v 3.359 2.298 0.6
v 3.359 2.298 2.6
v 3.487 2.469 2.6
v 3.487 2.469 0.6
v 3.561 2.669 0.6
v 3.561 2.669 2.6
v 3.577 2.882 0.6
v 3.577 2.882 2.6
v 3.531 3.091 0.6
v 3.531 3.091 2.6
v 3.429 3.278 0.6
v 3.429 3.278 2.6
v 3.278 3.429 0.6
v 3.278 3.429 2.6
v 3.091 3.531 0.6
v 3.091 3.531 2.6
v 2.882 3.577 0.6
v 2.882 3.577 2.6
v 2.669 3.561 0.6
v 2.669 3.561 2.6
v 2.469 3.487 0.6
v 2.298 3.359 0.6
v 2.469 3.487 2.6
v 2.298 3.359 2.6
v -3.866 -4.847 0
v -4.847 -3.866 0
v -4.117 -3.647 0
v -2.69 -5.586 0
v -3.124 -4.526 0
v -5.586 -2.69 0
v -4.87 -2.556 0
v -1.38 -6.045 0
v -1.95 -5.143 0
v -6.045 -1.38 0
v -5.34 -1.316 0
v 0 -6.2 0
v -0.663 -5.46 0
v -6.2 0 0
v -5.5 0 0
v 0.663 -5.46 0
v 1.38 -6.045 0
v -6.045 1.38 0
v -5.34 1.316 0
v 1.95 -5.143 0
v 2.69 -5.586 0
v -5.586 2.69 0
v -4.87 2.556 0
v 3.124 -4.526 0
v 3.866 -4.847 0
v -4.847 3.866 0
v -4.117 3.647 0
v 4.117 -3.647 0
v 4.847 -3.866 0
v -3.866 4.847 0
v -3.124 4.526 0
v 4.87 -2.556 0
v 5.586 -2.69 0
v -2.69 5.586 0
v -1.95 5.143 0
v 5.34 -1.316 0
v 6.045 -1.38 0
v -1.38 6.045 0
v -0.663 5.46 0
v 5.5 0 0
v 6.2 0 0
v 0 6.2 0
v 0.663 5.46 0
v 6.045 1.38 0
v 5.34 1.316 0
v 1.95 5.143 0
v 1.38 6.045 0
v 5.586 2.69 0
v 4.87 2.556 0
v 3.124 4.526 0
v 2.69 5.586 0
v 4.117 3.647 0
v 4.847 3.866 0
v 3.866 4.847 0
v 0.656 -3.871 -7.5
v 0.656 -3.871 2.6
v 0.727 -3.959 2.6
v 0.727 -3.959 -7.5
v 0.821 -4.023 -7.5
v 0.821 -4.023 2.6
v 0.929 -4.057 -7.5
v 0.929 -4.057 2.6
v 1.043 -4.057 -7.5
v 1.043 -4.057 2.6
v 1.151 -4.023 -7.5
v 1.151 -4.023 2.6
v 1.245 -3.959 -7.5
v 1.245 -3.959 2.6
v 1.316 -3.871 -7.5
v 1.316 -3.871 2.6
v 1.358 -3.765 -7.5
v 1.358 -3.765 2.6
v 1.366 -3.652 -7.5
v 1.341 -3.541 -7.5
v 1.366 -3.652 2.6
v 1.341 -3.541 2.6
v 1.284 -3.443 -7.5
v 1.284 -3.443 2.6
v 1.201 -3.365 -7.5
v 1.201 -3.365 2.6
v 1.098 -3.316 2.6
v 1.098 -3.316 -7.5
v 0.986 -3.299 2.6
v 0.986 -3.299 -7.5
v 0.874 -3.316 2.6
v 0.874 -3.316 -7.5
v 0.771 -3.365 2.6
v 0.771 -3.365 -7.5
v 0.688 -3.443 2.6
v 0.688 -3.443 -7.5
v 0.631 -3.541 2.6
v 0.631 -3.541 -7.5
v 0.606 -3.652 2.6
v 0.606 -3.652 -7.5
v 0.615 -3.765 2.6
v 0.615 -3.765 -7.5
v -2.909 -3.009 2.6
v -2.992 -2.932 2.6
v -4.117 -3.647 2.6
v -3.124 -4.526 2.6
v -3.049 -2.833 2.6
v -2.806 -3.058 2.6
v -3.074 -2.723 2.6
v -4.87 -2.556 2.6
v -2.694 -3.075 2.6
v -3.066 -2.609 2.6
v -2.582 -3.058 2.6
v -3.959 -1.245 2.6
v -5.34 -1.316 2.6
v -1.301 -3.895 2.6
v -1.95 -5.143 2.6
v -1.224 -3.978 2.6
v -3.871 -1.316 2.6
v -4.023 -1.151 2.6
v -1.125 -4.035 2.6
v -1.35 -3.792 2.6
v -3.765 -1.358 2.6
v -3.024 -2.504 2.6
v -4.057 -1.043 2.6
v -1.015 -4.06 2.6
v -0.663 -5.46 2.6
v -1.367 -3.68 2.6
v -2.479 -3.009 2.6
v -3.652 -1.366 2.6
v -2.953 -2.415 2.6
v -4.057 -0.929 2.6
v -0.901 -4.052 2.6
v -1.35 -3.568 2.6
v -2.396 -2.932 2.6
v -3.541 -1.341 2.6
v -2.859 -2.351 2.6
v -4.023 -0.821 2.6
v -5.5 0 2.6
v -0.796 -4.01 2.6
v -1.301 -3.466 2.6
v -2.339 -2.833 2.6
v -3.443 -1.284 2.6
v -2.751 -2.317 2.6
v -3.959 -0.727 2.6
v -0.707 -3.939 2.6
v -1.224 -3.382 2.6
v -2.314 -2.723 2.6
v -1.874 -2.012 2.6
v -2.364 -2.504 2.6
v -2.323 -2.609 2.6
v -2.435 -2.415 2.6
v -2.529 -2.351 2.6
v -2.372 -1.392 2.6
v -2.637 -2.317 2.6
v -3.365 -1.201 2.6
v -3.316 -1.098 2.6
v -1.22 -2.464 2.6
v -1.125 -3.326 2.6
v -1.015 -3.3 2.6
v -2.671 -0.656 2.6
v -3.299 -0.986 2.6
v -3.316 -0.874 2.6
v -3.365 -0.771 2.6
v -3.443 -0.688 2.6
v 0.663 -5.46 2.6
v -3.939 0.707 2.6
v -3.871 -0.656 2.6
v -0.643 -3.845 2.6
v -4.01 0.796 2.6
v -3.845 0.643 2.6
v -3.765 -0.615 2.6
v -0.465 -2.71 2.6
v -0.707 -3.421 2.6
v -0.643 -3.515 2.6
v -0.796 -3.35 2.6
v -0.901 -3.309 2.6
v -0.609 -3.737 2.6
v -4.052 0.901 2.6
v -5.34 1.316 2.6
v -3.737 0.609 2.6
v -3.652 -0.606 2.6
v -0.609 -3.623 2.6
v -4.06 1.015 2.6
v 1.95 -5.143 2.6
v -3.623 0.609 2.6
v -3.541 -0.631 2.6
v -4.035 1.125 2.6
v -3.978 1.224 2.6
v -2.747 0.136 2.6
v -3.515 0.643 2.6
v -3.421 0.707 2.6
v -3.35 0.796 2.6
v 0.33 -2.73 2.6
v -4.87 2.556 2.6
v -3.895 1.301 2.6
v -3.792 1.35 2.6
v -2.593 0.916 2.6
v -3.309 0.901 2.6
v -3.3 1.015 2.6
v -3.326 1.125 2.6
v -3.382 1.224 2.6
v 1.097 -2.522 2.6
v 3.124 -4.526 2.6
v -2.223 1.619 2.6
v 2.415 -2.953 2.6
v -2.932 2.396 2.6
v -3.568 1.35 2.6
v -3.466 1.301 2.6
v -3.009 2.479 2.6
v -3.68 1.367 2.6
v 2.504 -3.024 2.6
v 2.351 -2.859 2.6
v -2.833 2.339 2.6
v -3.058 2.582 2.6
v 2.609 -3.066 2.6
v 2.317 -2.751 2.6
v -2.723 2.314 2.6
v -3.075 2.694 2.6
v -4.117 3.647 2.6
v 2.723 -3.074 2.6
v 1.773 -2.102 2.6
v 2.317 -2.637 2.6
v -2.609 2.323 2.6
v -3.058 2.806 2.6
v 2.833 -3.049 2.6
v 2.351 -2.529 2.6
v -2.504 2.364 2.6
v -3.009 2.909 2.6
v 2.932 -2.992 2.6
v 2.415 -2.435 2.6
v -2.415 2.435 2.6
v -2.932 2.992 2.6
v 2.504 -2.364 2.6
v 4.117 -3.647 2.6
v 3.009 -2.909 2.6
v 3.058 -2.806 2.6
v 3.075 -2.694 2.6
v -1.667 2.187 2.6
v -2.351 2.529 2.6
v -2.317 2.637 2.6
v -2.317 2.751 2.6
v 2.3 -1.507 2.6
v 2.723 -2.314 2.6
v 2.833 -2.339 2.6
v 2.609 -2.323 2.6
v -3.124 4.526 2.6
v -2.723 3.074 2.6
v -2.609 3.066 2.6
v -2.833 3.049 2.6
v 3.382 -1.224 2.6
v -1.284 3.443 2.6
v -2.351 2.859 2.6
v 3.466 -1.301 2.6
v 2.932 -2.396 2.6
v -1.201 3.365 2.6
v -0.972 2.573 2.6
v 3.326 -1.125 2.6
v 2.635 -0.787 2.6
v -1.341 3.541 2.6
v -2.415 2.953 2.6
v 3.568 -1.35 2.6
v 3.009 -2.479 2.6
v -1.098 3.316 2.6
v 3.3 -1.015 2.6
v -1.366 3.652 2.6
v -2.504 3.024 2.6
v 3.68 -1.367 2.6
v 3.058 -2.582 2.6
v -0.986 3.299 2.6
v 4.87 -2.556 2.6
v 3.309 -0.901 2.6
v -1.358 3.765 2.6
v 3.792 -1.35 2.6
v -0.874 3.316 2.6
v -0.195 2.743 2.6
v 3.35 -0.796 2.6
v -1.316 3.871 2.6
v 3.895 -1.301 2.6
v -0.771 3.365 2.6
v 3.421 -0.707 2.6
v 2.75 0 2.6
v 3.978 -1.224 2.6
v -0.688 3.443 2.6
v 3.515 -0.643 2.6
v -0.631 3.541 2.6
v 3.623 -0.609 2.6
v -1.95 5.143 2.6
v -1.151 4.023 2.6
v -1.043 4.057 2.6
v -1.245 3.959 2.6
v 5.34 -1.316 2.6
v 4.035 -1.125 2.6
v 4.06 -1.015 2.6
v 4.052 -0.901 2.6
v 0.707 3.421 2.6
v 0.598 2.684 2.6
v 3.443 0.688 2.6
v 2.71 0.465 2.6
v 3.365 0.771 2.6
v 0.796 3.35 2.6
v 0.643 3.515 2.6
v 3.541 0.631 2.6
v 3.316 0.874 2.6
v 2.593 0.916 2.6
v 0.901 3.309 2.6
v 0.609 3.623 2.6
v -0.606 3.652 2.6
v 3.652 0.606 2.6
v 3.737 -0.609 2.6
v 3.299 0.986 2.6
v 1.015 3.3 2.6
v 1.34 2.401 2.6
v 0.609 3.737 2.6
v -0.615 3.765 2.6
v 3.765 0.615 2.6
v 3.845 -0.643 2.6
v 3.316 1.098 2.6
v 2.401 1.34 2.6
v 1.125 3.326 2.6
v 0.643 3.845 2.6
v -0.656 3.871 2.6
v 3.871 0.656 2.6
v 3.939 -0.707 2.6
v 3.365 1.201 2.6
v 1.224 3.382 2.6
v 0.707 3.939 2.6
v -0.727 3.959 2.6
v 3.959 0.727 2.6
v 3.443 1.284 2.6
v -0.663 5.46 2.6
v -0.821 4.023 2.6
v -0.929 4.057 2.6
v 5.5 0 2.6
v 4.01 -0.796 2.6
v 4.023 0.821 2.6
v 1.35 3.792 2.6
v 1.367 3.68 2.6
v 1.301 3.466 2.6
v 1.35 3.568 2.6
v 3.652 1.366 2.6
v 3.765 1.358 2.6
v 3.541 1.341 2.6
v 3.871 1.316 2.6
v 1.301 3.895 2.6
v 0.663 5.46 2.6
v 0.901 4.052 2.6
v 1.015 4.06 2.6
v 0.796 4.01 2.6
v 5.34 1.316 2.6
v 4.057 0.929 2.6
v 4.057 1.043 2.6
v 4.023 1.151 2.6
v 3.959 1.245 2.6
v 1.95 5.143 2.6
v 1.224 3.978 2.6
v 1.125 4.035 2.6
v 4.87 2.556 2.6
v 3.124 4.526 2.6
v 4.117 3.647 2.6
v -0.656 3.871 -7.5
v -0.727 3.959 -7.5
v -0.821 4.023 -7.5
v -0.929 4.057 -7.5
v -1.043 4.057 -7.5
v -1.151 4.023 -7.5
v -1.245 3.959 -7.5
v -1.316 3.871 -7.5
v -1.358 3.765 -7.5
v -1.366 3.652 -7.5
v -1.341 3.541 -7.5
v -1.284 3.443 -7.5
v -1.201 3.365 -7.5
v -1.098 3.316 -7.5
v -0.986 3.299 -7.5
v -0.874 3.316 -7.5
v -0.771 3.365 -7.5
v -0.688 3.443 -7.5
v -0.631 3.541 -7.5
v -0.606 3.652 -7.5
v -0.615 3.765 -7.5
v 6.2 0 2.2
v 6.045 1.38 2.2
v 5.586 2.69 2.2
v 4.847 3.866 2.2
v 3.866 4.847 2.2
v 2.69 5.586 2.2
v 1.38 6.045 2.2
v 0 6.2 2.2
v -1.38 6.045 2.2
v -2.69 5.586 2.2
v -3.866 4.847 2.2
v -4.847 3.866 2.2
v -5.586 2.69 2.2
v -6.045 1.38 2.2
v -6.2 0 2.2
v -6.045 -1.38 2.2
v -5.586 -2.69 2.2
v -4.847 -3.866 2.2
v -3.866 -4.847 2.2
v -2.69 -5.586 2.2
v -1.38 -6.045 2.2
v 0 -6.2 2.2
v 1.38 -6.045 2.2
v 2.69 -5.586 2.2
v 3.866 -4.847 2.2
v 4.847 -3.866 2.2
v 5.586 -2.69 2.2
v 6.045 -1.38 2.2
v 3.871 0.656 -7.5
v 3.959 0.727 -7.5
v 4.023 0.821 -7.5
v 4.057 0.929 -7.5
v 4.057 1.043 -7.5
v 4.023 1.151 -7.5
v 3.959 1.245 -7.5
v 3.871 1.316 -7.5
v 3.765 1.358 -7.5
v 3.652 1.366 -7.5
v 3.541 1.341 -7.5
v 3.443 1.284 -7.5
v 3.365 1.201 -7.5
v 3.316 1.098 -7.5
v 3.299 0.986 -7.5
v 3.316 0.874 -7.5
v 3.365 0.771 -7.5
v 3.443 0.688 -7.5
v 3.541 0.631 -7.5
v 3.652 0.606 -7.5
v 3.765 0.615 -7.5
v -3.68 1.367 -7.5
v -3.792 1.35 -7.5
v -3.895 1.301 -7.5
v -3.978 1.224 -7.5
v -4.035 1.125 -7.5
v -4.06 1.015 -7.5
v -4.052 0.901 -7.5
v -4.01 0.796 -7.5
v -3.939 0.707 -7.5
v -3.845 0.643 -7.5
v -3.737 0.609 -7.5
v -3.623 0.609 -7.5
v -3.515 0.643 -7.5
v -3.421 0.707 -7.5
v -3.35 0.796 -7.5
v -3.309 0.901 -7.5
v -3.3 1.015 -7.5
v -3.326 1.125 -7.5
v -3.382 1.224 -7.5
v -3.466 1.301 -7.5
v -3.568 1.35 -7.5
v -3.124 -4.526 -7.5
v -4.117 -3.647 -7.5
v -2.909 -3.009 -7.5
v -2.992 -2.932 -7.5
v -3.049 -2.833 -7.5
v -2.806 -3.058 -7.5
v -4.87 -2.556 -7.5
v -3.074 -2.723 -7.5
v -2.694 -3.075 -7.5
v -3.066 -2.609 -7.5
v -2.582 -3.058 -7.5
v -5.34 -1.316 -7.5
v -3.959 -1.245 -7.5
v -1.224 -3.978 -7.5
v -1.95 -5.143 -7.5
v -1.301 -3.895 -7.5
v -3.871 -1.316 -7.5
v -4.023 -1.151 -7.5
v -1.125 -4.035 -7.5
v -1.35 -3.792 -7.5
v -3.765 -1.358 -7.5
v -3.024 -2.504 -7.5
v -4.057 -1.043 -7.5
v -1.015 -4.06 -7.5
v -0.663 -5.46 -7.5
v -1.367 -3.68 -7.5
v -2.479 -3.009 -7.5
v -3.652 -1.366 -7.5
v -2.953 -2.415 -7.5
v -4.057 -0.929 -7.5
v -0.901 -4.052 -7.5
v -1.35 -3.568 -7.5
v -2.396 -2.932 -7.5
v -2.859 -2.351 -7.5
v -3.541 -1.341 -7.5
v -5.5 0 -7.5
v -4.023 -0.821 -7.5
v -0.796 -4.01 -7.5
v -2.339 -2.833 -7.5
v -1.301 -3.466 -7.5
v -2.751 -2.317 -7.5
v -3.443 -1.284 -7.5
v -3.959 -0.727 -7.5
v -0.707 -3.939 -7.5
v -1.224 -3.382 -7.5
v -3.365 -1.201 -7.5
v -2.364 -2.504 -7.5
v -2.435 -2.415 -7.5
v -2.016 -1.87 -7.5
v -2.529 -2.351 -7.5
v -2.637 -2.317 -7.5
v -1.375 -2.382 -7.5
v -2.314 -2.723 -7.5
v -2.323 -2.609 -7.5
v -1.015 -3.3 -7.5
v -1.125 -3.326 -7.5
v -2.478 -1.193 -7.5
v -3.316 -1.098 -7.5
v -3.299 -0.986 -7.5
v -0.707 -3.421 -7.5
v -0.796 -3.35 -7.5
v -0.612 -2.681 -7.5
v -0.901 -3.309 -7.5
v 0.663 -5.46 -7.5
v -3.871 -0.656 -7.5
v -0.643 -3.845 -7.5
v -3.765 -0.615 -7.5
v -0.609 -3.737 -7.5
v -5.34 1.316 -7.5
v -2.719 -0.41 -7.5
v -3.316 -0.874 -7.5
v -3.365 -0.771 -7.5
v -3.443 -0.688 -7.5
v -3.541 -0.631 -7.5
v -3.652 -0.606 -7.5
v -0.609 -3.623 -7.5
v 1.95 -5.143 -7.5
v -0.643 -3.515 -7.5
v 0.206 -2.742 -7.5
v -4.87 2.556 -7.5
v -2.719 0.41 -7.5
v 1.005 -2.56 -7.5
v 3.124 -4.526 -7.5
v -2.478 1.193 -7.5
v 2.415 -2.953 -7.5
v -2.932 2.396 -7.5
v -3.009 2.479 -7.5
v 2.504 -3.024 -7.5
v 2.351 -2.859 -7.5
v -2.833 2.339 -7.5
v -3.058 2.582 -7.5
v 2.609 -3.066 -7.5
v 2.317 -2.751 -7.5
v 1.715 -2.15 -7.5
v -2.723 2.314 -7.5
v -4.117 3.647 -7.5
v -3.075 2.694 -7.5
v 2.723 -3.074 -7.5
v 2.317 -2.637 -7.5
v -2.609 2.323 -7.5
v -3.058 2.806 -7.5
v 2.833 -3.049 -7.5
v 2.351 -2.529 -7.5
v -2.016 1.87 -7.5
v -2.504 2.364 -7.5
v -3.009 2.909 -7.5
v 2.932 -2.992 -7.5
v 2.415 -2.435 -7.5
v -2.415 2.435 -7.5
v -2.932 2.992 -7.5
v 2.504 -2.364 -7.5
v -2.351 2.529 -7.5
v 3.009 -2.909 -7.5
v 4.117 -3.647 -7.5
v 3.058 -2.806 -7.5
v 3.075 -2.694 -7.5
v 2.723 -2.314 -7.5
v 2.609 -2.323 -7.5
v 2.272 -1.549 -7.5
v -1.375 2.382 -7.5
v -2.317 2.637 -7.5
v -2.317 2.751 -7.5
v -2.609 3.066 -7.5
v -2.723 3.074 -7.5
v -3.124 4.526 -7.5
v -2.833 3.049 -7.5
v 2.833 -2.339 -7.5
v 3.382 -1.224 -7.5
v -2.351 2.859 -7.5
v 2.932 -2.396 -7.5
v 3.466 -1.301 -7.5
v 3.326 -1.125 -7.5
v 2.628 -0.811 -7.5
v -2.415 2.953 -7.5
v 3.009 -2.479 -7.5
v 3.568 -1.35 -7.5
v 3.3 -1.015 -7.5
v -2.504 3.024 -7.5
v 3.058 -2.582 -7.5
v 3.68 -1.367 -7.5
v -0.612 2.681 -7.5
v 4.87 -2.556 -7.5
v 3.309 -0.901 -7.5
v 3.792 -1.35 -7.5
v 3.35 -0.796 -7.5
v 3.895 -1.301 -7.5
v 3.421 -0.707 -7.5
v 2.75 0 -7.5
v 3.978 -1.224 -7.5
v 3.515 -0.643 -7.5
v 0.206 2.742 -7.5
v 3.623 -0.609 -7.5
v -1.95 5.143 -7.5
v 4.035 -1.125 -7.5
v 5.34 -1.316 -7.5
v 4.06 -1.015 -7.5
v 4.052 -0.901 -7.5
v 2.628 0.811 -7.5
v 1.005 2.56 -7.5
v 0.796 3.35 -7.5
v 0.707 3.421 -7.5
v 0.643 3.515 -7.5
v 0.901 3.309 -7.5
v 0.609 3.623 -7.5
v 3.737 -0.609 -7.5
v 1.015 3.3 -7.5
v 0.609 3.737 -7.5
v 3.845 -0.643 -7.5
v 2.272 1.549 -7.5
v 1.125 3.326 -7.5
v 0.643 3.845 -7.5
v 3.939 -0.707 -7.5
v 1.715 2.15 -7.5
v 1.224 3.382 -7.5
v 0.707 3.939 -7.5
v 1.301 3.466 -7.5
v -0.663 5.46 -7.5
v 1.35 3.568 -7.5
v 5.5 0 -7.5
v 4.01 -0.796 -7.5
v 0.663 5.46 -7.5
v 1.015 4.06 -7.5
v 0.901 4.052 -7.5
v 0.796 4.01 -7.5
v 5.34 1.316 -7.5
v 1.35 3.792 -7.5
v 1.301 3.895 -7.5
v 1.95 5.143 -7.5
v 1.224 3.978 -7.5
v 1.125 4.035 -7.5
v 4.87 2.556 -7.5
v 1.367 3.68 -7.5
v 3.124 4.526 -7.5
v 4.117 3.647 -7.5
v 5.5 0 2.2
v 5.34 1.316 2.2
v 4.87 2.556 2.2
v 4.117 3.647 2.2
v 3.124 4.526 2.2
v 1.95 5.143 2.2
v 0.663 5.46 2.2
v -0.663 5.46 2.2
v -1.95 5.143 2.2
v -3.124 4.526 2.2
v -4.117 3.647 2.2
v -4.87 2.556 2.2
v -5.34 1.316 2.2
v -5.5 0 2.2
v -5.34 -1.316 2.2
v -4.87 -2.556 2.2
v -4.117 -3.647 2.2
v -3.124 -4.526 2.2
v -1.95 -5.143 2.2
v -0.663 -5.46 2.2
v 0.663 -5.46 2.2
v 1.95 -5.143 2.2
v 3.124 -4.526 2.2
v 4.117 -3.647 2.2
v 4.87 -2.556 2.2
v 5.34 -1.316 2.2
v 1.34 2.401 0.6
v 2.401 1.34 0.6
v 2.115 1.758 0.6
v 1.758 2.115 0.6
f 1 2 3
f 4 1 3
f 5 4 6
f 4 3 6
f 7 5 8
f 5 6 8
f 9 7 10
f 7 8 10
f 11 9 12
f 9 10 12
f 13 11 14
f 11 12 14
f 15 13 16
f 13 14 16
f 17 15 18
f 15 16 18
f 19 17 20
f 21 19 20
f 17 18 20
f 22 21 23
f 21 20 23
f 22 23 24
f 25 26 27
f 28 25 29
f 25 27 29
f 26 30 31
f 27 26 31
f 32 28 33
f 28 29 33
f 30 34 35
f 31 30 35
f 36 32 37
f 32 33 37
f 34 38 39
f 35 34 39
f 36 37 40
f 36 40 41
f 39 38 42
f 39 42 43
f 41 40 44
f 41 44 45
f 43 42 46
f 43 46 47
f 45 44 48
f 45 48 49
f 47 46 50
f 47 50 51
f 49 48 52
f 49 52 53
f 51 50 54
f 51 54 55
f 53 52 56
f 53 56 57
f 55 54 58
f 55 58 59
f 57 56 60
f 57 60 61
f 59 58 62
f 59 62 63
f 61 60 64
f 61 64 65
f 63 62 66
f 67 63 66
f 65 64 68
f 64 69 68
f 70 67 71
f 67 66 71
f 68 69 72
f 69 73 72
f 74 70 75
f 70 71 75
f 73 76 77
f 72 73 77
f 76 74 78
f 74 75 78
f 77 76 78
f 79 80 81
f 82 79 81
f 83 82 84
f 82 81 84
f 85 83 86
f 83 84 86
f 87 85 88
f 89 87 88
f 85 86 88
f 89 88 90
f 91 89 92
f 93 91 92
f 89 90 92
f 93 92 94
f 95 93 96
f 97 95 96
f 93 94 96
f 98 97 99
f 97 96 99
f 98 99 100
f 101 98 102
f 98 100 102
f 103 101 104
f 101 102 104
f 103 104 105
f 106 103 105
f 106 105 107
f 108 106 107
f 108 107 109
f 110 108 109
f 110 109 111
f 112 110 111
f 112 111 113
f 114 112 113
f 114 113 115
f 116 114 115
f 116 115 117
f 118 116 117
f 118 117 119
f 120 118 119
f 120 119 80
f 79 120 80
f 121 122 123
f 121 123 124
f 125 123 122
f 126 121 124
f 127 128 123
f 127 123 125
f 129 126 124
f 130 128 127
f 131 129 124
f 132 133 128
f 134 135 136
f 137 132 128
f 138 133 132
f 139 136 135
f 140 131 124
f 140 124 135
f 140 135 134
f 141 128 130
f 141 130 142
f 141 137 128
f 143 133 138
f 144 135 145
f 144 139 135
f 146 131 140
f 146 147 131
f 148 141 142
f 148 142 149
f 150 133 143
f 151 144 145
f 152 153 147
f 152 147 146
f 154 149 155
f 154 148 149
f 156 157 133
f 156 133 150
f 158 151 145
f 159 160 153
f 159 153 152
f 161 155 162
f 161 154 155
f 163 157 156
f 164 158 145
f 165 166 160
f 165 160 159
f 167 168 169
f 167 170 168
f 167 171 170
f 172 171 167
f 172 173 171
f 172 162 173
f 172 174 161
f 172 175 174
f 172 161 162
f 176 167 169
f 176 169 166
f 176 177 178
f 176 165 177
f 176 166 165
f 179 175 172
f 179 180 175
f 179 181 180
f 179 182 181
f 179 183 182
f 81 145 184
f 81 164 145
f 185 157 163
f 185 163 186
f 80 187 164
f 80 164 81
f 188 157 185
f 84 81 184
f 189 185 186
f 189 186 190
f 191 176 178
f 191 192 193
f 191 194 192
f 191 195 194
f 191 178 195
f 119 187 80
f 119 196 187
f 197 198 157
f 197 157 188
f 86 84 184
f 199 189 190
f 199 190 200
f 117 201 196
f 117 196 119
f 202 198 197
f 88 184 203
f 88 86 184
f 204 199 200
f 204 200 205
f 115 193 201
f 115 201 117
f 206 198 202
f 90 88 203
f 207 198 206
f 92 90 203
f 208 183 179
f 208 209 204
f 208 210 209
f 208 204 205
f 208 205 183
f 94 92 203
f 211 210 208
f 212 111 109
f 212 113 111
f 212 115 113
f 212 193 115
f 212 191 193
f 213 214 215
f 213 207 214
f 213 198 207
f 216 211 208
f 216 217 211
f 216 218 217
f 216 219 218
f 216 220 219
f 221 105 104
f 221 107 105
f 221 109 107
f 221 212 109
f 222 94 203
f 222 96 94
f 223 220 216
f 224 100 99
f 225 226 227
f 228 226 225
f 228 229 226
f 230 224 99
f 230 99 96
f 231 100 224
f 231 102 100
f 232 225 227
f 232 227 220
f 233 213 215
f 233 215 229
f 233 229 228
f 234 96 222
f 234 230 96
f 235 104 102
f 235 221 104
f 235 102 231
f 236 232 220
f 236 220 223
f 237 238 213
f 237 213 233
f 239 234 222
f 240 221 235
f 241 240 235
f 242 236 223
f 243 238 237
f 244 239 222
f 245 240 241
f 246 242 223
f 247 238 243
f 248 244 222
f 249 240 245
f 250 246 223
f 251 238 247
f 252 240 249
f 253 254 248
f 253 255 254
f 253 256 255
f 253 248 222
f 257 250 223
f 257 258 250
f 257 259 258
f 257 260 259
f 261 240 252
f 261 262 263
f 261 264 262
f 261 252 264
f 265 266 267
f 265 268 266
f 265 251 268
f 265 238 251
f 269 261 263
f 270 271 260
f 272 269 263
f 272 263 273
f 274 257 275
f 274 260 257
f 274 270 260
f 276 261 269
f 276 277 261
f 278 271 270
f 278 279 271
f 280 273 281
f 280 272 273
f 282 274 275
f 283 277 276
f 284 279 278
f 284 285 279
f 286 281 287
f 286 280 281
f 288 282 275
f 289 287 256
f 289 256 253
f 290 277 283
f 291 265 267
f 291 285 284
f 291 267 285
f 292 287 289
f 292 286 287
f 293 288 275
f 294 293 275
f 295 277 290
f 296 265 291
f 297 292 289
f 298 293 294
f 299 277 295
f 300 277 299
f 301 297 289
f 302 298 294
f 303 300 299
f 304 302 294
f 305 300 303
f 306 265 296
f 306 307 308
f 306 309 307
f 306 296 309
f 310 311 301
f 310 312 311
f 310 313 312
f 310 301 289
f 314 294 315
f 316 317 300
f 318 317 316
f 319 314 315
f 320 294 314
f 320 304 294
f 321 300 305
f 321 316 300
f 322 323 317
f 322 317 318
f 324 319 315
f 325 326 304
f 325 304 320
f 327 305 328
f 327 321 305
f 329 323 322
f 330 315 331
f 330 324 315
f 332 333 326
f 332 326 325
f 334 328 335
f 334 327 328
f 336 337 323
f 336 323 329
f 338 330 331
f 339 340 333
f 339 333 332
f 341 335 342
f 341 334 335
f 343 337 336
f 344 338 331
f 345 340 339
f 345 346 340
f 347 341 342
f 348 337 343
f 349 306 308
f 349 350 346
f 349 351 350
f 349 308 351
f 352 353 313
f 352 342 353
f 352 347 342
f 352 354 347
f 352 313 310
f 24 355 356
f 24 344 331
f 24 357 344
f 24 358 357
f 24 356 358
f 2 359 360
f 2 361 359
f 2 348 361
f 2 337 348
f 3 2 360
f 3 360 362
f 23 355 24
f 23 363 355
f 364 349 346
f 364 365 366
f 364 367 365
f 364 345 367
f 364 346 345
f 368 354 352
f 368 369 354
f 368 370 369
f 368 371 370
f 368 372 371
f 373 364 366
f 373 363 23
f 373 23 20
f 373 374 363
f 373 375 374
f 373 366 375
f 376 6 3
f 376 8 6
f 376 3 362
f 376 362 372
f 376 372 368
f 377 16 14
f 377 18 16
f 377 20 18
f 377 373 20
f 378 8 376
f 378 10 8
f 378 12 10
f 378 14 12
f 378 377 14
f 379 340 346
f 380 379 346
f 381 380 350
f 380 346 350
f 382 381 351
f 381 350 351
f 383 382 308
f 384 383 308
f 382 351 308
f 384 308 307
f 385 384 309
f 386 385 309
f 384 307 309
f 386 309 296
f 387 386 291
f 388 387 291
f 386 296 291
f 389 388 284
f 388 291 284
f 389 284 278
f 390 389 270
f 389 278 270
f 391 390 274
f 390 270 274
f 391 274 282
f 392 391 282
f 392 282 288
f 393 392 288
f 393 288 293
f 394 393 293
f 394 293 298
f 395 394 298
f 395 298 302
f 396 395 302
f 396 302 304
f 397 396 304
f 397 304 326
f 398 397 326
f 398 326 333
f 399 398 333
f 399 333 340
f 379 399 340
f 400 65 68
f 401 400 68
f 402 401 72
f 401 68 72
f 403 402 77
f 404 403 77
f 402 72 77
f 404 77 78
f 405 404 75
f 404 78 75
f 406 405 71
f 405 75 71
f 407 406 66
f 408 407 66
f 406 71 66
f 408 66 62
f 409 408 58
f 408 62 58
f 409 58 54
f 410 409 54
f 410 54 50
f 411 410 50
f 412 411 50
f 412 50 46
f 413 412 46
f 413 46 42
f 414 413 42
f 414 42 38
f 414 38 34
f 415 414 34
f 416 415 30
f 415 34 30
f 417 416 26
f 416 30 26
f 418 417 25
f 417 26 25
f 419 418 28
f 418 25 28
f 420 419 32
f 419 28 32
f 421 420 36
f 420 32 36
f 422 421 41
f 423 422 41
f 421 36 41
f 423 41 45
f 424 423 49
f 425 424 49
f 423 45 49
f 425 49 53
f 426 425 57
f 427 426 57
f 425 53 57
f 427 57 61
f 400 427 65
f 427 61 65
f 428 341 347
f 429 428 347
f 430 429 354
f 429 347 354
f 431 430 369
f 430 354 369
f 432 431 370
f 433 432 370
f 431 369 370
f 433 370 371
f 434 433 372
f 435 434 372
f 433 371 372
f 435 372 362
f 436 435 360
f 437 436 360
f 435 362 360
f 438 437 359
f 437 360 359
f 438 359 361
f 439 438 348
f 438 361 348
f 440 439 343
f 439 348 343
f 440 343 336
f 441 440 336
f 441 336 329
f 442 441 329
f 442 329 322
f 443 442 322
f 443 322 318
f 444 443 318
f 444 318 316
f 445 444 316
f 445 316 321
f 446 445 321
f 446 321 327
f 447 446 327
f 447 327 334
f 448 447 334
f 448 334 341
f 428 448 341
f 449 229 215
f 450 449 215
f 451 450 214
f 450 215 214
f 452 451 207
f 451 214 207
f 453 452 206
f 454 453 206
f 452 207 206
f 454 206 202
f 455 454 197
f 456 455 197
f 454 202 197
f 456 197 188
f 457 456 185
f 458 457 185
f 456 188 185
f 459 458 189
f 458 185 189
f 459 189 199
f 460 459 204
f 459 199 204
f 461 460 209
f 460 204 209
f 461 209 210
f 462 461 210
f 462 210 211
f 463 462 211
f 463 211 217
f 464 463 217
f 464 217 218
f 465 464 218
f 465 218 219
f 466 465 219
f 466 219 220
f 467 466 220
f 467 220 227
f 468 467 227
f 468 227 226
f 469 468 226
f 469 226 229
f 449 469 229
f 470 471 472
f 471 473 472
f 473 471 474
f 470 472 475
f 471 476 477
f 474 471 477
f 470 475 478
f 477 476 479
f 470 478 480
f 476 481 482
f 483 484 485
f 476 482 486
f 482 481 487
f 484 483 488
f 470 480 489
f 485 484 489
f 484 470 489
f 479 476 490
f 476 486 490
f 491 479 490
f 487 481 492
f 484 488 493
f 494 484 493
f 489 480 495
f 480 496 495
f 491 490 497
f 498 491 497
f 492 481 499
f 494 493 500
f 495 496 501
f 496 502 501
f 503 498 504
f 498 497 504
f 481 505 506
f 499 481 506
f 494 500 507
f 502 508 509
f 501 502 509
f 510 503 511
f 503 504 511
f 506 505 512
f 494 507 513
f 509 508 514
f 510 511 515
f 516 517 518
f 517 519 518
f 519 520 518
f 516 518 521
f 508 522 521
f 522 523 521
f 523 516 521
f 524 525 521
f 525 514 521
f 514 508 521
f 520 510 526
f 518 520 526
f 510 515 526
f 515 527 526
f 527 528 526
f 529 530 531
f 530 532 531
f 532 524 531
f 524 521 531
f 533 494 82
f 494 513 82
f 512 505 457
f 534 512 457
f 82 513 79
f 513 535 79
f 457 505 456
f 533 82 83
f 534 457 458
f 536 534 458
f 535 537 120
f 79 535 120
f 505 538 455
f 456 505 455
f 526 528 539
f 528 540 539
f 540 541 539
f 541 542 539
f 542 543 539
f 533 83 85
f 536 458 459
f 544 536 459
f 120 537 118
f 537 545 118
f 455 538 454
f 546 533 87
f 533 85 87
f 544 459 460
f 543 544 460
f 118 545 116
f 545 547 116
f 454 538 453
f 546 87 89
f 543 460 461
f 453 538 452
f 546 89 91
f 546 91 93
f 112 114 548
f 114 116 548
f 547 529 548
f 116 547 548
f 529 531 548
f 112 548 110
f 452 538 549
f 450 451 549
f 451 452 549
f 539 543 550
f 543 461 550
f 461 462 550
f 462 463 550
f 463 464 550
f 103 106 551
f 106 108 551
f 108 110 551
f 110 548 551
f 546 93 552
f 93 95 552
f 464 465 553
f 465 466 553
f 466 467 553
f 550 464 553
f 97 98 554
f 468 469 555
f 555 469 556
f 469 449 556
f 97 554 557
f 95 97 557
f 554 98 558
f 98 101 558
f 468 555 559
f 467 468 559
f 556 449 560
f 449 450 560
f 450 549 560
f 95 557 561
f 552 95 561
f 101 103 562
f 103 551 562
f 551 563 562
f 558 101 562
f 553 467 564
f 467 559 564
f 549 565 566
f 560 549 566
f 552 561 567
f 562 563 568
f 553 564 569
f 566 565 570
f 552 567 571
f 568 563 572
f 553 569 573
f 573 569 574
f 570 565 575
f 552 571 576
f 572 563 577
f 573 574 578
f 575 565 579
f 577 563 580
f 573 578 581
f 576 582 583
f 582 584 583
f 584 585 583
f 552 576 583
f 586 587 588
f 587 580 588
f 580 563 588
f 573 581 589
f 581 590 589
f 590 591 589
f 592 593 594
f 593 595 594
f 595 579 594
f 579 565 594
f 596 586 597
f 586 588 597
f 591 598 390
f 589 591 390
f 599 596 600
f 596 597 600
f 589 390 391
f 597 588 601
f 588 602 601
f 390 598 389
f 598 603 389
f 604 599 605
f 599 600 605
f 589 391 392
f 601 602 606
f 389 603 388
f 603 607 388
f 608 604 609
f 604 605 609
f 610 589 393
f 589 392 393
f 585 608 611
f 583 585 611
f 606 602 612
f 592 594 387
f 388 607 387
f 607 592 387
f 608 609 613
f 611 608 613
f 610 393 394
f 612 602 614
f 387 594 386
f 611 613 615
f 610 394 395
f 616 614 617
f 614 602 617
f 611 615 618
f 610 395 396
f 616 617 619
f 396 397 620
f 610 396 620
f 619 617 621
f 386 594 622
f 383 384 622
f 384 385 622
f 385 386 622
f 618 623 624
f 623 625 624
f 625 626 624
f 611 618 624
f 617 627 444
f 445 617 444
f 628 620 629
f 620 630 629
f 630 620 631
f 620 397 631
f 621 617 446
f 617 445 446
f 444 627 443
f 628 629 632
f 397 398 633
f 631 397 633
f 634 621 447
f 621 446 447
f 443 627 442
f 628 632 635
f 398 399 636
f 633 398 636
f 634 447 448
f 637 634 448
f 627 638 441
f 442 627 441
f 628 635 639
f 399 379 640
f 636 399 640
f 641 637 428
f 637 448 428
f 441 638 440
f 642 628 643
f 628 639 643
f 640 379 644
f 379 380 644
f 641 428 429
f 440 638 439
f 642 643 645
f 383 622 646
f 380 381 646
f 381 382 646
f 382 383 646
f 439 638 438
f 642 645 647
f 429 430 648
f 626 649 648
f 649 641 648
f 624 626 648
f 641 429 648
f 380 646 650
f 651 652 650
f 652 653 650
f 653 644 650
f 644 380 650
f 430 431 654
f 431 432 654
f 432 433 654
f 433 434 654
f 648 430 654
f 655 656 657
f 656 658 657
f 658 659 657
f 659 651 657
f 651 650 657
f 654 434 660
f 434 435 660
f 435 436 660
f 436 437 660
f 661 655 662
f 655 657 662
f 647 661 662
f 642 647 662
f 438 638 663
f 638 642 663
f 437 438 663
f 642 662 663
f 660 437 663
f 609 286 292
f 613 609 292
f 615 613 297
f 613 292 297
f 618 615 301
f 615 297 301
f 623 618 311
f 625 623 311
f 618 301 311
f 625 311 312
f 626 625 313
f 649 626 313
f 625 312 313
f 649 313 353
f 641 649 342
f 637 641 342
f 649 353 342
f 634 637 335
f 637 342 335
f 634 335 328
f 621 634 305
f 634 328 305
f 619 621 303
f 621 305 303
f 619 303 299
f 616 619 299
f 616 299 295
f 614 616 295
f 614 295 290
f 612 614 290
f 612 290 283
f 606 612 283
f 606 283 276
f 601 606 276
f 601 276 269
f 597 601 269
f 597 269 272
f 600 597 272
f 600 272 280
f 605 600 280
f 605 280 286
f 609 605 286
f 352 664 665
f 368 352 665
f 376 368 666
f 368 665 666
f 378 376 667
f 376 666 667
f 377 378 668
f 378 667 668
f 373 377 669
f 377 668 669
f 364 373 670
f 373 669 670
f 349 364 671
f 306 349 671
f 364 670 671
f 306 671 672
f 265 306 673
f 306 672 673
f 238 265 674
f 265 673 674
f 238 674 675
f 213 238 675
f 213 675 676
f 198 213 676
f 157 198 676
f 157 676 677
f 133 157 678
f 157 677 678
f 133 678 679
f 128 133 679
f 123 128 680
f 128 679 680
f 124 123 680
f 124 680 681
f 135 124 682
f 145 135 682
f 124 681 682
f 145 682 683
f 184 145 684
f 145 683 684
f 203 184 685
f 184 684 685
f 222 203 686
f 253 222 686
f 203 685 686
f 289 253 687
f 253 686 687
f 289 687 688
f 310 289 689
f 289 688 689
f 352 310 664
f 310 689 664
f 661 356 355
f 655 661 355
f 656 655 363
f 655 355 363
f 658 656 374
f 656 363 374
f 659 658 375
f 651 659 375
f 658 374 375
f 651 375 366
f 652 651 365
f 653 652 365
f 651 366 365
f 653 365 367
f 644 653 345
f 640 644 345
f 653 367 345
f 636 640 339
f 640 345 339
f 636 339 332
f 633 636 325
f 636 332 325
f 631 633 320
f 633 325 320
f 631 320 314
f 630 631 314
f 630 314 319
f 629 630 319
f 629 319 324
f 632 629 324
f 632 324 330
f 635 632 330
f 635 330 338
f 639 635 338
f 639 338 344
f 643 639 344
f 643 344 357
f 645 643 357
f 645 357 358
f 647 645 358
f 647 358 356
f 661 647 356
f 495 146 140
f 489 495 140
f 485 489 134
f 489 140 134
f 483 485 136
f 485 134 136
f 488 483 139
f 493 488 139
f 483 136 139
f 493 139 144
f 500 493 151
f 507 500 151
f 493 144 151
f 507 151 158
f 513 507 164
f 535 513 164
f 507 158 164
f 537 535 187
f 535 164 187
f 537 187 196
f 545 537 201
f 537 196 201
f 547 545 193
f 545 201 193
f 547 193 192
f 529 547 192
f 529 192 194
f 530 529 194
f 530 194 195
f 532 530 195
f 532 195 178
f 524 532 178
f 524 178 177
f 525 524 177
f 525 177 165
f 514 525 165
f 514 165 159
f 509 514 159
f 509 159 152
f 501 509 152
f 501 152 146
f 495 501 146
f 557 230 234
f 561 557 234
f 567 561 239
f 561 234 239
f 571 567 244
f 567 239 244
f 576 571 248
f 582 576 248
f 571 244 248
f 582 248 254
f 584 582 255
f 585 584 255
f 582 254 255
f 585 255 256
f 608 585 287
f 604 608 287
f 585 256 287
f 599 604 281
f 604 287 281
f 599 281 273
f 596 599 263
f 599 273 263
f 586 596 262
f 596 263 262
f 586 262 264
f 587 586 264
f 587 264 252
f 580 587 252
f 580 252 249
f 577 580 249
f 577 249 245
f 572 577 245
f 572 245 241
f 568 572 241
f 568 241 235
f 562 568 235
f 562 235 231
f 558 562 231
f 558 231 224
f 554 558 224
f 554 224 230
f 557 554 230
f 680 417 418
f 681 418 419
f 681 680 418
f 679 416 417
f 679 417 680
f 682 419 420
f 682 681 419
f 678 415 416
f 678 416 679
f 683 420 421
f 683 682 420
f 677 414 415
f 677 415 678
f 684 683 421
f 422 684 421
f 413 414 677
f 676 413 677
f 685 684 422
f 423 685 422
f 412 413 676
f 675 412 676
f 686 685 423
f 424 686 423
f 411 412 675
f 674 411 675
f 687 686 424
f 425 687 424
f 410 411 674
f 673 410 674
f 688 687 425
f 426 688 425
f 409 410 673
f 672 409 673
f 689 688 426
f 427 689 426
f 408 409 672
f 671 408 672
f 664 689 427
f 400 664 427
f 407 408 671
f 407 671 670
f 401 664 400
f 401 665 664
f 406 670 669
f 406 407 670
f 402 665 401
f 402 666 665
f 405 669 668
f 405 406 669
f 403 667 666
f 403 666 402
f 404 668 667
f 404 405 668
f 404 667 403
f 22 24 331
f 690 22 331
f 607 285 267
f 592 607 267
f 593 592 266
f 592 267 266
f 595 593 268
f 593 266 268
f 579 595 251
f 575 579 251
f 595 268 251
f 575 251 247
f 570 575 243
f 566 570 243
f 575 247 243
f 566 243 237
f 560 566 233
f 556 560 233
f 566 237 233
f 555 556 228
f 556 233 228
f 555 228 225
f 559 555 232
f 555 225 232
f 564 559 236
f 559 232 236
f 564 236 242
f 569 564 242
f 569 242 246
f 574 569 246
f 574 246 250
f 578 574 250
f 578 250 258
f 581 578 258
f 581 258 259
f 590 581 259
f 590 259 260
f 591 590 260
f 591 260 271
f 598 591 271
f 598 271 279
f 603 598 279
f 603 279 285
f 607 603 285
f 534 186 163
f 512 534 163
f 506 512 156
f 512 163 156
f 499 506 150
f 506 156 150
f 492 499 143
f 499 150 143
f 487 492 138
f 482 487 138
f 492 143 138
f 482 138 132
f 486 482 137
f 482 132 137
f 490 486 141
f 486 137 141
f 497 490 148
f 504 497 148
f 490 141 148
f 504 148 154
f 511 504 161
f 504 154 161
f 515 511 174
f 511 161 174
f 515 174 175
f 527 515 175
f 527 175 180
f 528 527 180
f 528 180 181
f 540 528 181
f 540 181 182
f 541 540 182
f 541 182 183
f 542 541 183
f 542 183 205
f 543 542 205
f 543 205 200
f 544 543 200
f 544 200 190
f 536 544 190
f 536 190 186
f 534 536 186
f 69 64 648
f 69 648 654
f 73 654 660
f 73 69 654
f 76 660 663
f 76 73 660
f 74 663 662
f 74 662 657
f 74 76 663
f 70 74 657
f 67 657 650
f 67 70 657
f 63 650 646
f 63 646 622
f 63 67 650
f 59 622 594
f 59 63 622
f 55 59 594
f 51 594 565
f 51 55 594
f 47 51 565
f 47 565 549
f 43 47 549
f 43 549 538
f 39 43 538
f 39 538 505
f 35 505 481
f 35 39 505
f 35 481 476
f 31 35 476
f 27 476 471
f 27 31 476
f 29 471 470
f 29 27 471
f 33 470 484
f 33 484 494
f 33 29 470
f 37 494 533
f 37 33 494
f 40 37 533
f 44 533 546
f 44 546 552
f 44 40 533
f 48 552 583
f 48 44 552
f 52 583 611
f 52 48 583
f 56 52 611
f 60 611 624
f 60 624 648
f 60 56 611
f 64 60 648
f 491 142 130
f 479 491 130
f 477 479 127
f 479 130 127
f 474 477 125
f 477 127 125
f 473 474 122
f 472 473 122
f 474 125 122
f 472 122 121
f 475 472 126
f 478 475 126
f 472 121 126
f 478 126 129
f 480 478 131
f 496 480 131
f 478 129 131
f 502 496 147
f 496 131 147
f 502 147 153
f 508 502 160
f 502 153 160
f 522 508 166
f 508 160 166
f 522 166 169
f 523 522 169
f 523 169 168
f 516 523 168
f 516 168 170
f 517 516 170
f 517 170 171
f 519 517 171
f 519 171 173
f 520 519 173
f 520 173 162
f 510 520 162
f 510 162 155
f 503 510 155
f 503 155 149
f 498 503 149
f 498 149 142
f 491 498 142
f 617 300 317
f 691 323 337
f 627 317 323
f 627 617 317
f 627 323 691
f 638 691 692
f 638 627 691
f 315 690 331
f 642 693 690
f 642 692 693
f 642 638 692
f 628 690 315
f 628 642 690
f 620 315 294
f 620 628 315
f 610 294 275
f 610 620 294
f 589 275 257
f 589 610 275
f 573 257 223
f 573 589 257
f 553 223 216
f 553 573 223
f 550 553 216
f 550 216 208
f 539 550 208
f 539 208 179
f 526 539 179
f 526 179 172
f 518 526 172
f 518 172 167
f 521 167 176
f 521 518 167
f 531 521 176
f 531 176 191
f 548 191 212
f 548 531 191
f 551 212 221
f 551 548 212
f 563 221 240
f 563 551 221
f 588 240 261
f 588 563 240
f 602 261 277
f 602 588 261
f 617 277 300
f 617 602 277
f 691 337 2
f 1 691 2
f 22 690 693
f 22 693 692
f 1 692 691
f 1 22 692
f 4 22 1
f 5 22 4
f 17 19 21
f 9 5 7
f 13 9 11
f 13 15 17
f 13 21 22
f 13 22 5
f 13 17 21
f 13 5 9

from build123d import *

# Parameters (mm, degrees)
SKETCH_1_R               = 6.2
SKETCH_1_R_2             = 2.75
EXTRUDE_1_DEPTH          = 2.2
SKETCH_1_5_R             = 5.5
SKETCH_1_5_R_2           = 2.75
EXTRUDE_3_DEPTH          = 7.5
EXTRUDE_START            = 2.2
SKETCH_1_6_R             = 5.5
SKETCH_1_6_R_2           = 2.75
EXTRUDE_4_DEPTH          = 0.4
SKETCH_2_R               = 0.381
CUT_EXTRUDE_1_DEPTH      = 14.374976635
PATTERN_CIRCULAR_1_COUNT = 12
CUT_EXTRUDE_2_DEPTH      = 2


with BuildPart() as part:
    # Sketch 1 → Extrude 1 (new body)
    with BuildSketch(Plane.XY):
        Circle(SKETCH_1_R)
        Circle(SKETCH_1_R_2, mode=Mode.SUBTRACT)
    extrude(amount=EXTRUDE_1_DEPTH)

    # Sketch 1_5 → Extrude 3 (add)
    with BuildSketch(Plane.XY):
        Circle(SKETCH_1_5_R)
        Circle(SKETCH_1_5_R_2, mode=Mode.SUBTRACT)
    extrude(amount=-EXTRUDE_3_DEPTH)

    # Sketch 1_6 → Extrude 4 (add)
    with BuildSketch(Plane.XY.offset(EXTRUDE_START)):
        Circle(SKETCH_1_6_R)
        Circle(SKETCH_1_6_R_2, mode=Mode.SUBTRACT)
    extrude(amount=EXTRUDE_4_DEPTH)

    # Sketch 2 → Cut-Extrude 1 (cut, through all)
    with BuildSketch(Plane.XY.offset(2.6)):
        with Locations((0.986100562, 3.680177398)):
            Circle(SKETCH_2_R)
    cut_extrude_1 = extrude(amount=-CUT_EXTRUDE_1_DEPTH, mode=Mode.SUBTRACT)

    # Pattern Circular 1: Cut-Extrude 1 ×12 about axis, 1 skipped
    pattern_circular_1_axis = Axis((0, 0, 0), (0, 0, 1))
    add([cut_extrude_1.rotate(pattern_circular_1_axis, i * 360 / PATTERN_CIRCULAR_1_COUNT) for i in range(1, PATTERN_CIRCULAR_1_COUNT) if i not in (11,)], mode=Mode.SUBTRACT)

    # Sketch 4 → Cut-Extrude 2 (cut)
    with BuildSketch(Plane.XY.offset(2.6)):
        with BuildLine():
            ThreePointArc((1.340498607, 2.401158779), (1.944543648, 1.944543648), (2.401158779, 1.340498607))
            Line((2.401158779, 1.340498607), (3.358757211, 2.298097039))
            ThreePointArc((3.358757211, 2.298097039), (3.358757211, 3.358757211), (2.298097039, 3.358757211))
            Line((2.298097039, 3.358757211), (1.340498607, 2.401158779))
        make_face()
    extrude(amount=-CUT_EXTRUDE_2_DEPTH, mode=Mode.SUBTRACT)


solid = part.part
